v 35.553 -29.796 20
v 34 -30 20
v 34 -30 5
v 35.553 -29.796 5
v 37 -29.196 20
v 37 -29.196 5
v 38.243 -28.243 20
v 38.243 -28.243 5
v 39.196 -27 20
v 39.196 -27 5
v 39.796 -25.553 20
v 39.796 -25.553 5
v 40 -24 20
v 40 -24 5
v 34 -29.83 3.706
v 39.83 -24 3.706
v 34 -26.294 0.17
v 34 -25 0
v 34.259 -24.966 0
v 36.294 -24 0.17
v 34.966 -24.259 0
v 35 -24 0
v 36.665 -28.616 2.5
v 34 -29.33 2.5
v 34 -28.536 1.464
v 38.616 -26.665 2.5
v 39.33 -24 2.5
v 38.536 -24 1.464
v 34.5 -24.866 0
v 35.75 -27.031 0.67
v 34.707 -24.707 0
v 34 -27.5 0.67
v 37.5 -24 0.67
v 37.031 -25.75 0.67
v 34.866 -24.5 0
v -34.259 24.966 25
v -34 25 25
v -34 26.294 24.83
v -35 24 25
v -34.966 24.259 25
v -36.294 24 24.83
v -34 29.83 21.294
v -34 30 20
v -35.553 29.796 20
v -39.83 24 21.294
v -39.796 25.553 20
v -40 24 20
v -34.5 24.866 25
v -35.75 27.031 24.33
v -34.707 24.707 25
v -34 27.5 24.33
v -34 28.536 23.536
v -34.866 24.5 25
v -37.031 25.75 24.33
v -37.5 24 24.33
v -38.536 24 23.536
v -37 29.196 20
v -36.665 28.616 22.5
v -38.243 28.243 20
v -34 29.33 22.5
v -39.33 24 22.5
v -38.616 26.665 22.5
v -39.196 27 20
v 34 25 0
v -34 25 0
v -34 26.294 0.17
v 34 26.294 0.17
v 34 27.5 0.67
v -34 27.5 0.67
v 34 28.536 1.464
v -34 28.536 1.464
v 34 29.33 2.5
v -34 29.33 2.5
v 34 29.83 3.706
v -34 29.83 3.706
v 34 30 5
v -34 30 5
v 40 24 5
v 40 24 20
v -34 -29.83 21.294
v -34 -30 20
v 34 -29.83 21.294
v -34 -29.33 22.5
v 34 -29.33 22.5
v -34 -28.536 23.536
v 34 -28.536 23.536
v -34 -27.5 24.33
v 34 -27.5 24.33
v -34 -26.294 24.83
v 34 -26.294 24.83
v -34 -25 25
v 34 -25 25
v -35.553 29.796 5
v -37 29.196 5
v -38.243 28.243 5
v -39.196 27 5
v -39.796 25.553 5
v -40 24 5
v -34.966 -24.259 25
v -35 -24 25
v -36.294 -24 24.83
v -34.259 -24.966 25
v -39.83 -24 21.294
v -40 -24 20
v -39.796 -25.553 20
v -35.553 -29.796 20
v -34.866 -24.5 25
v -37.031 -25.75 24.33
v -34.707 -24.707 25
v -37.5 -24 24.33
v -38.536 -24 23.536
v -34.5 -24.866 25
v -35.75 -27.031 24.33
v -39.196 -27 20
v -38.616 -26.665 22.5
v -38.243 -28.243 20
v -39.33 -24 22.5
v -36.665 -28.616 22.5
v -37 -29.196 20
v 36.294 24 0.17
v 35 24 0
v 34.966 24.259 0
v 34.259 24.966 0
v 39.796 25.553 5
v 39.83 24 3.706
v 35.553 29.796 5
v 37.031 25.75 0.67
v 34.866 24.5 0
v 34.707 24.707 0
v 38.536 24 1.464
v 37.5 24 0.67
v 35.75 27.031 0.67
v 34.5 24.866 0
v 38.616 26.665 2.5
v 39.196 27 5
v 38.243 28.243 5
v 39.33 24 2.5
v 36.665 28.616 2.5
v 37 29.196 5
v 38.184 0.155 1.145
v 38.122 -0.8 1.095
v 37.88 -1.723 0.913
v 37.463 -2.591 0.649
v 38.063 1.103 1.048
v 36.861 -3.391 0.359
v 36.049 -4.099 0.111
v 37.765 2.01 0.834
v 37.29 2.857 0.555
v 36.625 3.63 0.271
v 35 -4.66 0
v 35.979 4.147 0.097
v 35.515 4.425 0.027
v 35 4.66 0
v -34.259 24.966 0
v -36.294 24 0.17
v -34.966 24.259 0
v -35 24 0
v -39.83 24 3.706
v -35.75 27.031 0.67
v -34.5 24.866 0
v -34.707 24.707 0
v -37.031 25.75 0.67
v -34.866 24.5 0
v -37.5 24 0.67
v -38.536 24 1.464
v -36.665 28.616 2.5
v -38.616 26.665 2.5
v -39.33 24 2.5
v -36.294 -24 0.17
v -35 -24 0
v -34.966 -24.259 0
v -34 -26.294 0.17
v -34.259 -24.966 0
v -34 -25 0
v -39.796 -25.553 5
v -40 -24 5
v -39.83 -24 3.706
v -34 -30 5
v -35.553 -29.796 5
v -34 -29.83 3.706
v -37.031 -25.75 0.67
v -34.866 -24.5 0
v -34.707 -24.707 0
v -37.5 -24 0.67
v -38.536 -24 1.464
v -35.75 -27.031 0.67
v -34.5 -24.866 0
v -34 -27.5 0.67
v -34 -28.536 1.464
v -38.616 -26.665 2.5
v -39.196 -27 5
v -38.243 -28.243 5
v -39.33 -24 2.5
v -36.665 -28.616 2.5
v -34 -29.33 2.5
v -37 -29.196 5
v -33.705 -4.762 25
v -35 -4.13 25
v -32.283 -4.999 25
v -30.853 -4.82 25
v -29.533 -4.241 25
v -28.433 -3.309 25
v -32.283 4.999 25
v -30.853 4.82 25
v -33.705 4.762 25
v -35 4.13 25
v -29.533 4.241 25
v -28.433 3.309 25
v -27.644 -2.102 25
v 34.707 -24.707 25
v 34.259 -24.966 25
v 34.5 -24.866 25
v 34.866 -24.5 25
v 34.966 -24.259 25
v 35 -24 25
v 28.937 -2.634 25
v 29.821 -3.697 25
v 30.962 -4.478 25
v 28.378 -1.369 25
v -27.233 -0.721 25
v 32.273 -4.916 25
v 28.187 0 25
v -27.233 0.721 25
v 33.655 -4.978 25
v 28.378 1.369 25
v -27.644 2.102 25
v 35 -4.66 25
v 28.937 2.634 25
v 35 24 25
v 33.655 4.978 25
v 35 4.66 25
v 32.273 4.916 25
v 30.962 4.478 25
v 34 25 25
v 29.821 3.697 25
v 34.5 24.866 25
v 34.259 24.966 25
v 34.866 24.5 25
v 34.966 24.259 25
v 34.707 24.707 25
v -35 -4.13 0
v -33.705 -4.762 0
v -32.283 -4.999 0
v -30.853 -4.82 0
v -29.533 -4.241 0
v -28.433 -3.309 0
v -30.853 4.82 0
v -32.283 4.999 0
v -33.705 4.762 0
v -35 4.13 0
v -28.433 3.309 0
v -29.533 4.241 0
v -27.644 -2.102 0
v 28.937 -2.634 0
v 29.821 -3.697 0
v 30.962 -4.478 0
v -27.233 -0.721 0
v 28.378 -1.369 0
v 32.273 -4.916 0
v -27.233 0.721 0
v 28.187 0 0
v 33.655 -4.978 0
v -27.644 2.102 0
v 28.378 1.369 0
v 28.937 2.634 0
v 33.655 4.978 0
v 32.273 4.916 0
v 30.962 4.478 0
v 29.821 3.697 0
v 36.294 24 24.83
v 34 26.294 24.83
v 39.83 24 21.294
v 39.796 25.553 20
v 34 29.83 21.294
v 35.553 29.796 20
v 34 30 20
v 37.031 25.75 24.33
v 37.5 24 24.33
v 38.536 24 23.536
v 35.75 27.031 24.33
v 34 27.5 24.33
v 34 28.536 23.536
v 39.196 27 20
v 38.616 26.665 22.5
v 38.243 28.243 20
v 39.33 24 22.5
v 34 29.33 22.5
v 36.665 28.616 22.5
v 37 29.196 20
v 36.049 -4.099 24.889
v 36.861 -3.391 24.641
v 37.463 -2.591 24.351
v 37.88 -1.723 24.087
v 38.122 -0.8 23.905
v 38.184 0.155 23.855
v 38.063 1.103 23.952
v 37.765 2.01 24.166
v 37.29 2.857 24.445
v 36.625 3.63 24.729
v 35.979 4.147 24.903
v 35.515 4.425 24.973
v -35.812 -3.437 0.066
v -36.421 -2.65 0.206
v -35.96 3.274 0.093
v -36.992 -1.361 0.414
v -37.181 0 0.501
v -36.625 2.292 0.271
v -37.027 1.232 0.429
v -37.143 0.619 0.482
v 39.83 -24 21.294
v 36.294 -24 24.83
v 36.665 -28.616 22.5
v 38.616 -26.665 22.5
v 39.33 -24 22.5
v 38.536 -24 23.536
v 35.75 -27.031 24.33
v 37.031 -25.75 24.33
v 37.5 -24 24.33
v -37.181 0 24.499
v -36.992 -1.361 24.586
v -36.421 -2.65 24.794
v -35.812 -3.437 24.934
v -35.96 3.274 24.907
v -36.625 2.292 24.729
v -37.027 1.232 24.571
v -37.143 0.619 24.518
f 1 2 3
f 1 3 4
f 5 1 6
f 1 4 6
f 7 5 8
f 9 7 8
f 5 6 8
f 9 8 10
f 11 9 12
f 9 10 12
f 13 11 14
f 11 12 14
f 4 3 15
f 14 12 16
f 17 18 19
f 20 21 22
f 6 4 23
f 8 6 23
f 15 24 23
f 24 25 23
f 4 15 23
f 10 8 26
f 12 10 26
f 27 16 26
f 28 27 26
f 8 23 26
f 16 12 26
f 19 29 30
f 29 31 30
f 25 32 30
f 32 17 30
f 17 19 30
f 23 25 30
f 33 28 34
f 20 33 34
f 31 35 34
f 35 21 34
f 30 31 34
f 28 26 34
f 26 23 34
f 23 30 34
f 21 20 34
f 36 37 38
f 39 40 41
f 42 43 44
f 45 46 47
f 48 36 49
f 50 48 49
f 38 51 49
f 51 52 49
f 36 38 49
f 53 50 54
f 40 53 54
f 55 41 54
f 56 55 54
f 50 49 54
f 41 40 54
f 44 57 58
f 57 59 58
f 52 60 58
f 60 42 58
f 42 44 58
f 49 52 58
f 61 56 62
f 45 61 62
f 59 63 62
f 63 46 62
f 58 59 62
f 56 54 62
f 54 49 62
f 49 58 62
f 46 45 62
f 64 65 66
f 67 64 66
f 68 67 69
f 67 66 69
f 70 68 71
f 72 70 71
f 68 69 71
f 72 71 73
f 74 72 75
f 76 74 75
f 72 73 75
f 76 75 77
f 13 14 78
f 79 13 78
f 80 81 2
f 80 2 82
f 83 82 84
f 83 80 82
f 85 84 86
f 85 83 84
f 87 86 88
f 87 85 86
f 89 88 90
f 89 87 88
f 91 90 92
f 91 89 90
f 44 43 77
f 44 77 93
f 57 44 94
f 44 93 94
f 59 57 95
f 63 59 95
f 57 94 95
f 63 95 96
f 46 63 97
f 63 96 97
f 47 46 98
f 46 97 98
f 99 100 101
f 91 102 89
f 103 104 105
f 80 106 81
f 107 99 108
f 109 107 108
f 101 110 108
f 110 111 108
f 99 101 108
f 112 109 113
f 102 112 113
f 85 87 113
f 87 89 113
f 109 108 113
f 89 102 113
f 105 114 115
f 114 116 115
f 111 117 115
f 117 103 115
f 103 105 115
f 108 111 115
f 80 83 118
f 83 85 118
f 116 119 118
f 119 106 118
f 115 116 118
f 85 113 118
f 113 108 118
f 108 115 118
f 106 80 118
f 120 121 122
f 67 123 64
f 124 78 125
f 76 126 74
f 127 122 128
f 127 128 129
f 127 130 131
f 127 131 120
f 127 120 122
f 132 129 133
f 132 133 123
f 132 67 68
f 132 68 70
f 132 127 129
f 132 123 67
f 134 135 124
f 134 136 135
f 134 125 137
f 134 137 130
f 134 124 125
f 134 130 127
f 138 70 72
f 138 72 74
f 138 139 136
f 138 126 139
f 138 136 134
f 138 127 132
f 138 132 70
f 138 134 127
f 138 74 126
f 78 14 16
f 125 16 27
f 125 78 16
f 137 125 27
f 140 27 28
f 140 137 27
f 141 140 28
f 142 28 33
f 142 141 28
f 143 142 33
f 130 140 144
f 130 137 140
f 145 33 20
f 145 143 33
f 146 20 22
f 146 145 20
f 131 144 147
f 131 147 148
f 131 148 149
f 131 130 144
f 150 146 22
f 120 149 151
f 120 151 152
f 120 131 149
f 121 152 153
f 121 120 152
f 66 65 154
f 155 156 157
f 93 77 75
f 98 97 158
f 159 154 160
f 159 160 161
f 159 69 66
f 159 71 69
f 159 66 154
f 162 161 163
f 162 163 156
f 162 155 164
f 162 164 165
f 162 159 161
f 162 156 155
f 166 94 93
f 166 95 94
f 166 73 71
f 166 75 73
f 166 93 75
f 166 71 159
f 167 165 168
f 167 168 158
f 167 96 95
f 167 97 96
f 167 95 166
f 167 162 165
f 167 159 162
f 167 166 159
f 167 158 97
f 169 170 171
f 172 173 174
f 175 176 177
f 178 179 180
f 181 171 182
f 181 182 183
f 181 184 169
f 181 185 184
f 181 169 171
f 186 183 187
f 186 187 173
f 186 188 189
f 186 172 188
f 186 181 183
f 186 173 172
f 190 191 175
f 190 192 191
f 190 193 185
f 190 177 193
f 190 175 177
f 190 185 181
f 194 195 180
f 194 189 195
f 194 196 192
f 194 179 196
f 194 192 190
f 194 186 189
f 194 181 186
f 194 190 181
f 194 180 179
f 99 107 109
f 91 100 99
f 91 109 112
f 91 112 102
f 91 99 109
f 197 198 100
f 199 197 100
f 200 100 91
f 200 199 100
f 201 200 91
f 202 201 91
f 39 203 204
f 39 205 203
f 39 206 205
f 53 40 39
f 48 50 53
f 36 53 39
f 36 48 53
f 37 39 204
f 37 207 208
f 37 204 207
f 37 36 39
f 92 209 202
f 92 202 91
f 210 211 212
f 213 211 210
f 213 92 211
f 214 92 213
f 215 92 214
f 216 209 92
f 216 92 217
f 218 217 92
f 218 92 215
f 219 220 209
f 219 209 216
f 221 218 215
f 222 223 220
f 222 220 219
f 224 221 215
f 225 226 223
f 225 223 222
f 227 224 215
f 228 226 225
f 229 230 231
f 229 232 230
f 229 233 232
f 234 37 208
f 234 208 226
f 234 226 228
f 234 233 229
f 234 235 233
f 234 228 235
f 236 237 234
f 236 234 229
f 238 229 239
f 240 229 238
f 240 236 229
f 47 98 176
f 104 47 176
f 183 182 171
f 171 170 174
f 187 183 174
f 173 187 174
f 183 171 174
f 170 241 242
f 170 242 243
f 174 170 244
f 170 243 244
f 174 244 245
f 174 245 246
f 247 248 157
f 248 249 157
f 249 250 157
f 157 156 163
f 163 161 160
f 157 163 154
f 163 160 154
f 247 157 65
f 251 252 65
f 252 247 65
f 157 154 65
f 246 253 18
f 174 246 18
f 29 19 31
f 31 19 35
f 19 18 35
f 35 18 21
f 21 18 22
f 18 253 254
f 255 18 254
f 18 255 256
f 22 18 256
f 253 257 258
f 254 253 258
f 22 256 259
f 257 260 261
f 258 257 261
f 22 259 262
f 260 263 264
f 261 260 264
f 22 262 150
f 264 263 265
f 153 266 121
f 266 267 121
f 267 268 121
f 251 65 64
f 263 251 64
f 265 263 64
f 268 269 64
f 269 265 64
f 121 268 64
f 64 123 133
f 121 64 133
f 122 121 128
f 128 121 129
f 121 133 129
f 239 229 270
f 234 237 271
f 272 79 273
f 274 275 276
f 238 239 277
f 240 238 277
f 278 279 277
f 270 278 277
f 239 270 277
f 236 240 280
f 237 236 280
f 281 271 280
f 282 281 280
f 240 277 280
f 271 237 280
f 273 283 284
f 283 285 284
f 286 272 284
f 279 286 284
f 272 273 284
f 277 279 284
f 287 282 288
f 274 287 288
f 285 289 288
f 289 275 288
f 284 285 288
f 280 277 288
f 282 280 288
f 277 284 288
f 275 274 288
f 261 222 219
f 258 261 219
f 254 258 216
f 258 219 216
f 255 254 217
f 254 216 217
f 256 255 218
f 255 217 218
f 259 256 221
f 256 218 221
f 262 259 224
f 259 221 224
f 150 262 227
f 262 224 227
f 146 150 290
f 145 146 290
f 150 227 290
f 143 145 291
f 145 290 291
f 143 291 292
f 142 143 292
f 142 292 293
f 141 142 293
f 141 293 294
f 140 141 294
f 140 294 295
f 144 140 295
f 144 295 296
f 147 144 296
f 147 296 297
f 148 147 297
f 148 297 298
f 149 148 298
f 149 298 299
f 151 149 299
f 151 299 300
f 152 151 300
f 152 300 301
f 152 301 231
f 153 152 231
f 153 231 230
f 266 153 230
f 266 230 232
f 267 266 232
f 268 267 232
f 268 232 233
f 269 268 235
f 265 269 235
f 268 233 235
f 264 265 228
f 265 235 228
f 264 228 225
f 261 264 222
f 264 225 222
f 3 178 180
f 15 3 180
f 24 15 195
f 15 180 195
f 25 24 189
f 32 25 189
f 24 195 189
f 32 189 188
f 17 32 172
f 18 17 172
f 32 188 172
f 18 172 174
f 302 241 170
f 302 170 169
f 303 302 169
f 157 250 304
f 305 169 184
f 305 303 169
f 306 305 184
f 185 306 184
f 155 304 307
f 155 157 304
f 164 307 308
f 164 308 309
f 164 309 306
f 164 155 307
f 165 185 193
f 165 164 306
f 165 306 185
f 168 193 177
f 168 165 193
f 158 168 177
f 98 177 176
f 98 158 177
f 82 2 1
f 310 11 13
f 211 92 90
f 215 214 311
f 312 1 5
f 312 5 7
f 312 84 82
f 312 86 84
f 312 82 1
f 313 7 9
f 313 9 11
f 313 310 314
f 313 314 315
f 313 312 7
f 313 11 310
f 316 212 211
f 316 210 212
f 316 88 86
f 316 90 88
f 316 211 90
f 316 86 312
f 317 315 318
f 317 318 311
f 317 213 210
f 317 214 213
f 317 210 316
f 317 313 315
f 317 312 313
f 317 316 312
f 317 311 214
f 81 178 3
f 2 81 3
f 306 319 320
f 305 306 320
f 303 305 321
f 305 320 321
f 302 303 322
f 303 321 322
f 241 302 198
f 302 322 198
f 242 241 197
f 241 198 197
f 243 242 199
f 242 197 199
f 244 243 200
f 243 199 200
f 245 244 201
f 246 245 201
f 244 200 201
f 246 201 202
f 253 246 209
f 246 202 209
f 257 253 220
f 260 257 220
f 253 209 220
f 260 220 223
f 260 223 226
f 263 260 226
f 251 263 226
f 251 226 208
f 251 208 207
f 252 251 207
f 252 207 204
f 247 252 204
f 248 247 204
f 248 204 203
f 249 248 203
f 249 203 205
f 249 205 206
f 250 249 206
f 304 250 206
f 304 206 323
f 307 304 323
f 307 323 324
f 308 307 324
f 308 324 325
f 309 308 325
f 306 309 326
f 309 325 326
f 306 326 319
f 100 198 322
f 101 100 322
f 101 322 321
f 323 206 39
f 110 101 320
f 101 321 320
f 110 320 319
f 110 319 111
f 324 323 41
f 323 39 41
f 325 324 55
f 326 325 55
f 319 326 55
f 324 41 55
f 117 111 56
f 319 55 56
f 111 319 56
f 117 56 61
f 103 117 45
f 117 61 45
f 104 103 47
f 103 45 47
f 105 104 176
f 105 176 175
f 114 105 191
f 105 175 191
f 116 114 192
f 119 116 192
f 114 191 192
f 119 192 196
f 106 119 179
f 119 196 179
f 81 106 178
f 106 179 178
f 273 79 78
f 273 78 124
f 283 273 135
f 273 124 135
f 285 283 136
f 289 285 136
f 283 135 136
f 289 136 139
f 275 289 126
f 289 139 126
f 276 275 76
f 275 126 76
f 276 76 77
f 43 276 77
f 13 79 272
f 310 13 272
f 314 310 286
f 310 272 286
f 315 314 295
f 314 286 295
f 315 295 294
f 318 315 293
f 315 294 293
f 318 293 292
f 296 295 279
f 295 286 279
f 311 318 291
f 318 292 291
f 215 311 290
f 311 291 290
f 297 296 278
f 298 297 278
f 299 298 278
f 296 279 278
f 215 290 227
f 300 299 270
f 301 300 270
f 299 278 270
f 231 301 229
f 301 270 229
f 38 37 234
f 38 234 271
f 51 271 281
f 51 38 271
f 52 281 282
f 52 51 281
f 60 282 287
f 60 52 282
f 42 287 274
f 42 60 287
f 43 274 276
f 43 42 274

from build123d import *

# Parameters (mm, degrees)
F1_DEPTH     = 25
F2_D         = 10
F3_T1_DEPTH  = 48
F3_T3_DEPTH  = 68
F3_T6_ANGLE  = 90
F3_T8_ANGLE  = 90
F3_T10_ANGLE = 90
F3_T12_ANGLE = 90
F3_T14_ANGLE = 90
F3_T16_ANGLE = 90
F3_T18_ANGLE = 90
F3_T20_ANGLE = 90


# Not quite as in the source:
# - a fillet or chamfer that OpenCascade refuses, or shapes differently, is made with other operations: its cross-section is extruded or revolved along the edge and cut away or added


with BuildPart() as f1:
    # F0 (on Top) → F1 (new body)
    with BuildSketch(Plane.XY):
        with BuildLine():
            ThreePointArc((40, 24), (38.2426406871, 28.2426406871), (34, 30))
            Line((34, 30), (-34, 30))
            ThreePointArc((-34, 30), (-38.2426406871, 28.2426406871), (-40, 24))
            Line((-40, 24), (-40, -24))
            ThreePointArc((-40, -24), (-38.2426406871, -28.2426406871), (-34, -30))
            Line((-34, -30), (34, -30))
            ThreePointArc((34, -30), (38.2426406871, -28.2426406871), (40, -24))
            Line((40, -24), (40, 24))
        make_face()
    extrude(amount=F1_DEPTH)

    # F2 (through all)
    with Locations(Plane(origin=(0, 0, 0), x_dir=(1, 0, 0), z_dir=(0, 0, -1))):
        with Locations((-32.1810245514, 0), (33.1866517663, 0)):
            Hole(F2_D / 2)

    # F3: fillet of radius 5 on 16 edges, made by hand

    # F3_s2 → F3_t1 (cut)
    with BuildSketch(Plane.XZ.offset(-24)):
        with BuildLine():
            ThreePointArc((40, 20), (38.5355339059, 23.5355339059), (35, 25))
            Line((35, 25), (40, 25))
            Line((40, 25), (40, 20))
        make_face()
        with BuildLine():
            ThreePointArc((40, 5), (38.5355339059, 1.4644660941), (35, 0))
            Line((35, 0), (40, 0))
            Line((40, 0), (40, 5))
        make_face()
        with BuildLine():
            ThreePointArc((-35, 0), (-38.5355339059, 1.4644660941), (-40, 5))
            Line((-40, 5), (-40, 0))
            Line((-40, 0), (-35, 0))
        make_face()
        with BuildLine():
            ThreePointArc((-35, 25), (-38.5355339059, 23.5355339059), (-40, 20))
            Line((-40, 20), (-40, 25))
            Line((-40, 25), (-35, 25))
        make_face()
    extrude(amount=F3_T1_DEPTH, mode=Mode.SUBTRACT)

    # F3_s4 → F3_t3 (cut)
    with BuildSketch(Plane.YZ.offset(-34)):
        with BuildLine():
            ThreePointArc((-30, 5), (-28.5355339059, 1.4644660941), (-25, 0))
            Line((-25, 0), (-30, 0))
            Line((-30, 0), (-30, 5))
        make_face()
        with BuildLine():
            ThreePointArc((-30, 20), (-28.5355339059, 23.5355339059), (-25, 25))
            Line((-25, 25), (-30, 25))
            Line((-30, 25), (-30, 20))
        make_face()
        with BuildLine():
            ThreePointArc((25, 0), (28.5355339059, 1.4644660941), (30, 5))
            Line((30, 5), (30, 0))
            Line((30, 0), (25, 0))
        make_face()
        with BuildLine():
            ThreePointArc((25, 25), (28.5355339059, 23.5355339059), (30, 20))
            Line((30, 20), (30, 25))
            Line((30, 25), (25, 25))
        make_face()
    extrude(amount=F3_T3_DEPTH, mode=Mode.SUBTRACT)

    # F3_s5 → F3_t6 (revolve, cut)
    with BuildSketch(Plane.YZ.offset(34)):
        with BuildLine():
            ThreePointArc((-30, 5), (-28.5355339059, 1.4644660941), (-25, 0))
            Line((-25, 0), (-30, 0))
            Line((-30, 0), (-30, 5))
        make_face()
    revolve(axis=Axis((34, -24, 0), (0, 0, 1)), revolution_arc=F3_T6_ANGLE, mode=Mode.SUBTRACT)

    # F3_s7 → F3_t8 (revolve, cut)
    with BuildSketch(Plane.YZ.offset(34)):
        with BuildLine():
            ThreePointArc((-30, 20), (-28.5355339059, 23.5355339059), (-25, 25))
            Line((-25, 25), (-30, 25))
            Line((-30, 25), (-30, 20))
        make_face()
    revolve(axis=Axis((34, -24, 25), (0, 0, 1)), revolution_arc=F3_T8_ANGLE, mode=Mode.SUBTRACT)

    # F3_s9 → F3_t10 (revolve, cut)
    with BuildSketch(Plane.XZ.offset(24)):
        with BuildLine():
            ThreePointArc((-35, 0), (-38.5355339059, 1.4644660941), (-40, 5))
            Line((-40, 5), (-40, 0))
            Line((-40, 0), (-35, 0))
        make_face()
    revolve(axis=Axis((-34, -24, 0), (0, 0, 1)), revolution_arc=F3_T10_ANGLE, mode=Mode.SUBTRACT)

    # F3_s11 → F3_t12 (revolve, cut)
    with BuildSketch(Plane.XZ.offset(-24)):
        with BuildLine():
            ThreePointArc((35, 0), (38.5355339059, 1.4644660941), (40, 5))
            Line((40, 5), (40, 0))
            Line((40, 0), (35, 0))
        make_face()
    revolve(axis=Axis((34, 24, 0), (0, 0, 1)), revolution_arc=F3_T12_ANGLE, mode=Mode.SUBTRACT)

    # F3_s13 → F3_t14 (revolve, cut)
    with BuildSketch(Plane.YZ.offset(-34)):
        with BuildLine():
            ThreePointArc((25, 0), (28.5355339059, 1.4644660941), (30, 5))
            Line((30, 5), (30, 0))
            Line((30, 0), (25, 0))
        make_face()
    revolve(axis=Axis((-34, 24, 0), (0, 0, 1)), revolution_arc=F3_T14_ANGLE, mode=Mode.SUBTRACT)

    # F3_s15 → F3_t16 (revolve, cut)
    with BuildSketch(Plane.XZ.offset(24)):
        with BuildLine():
            ThreePointArc((-35, 25), (-38.5355339059, 23.5355339059), (-40, 20))
            Line((-40, 20), (-40, 25))
            Line((-40, 25), (-35, 25))
        make_face()
    revolve(axis=Axis((-34, -24, 25), (0, 0, 1)), revolution_arc=F3_T16_ANGLE, mode=Mode.SUBTRACT)

    # F3_s17 → F3_t18 (revolve, cut)
    with BuildSketch(Plane.XZ.offset(-24)):
        with BuildLine():
            ThreePointArc((35, 25), (38.5355339059, 23.5355339059), (40, 20))
            Line((40, 20), (40, 25))
            Line((40, 25), (35, 25))
        make_face()
    revolve(axis=Axis((34, 24, 25), (0, 0, 1)), revolution_arc=F3_T18_ANGLE, mode=Mode.SUBTRACT)

    # F3_s19 → F3_t20 (revolve, cut)
    with BuildSketch(Plane.YZ.offset(-34)):
        with BuildLine():
            ThreePointArc((25, 25), (28.5355339059, 23.5355339059), (30, 20))
            Line((30, 20), (30, 25))
            Line((30, 25), (25, 25))
        make_face()
    revolve(axis=Axis((-34, 24, 25), (0, 0, 1)), revolution_arc=F3_T20_ANGLE, mode=Mode.SUBTRACT)


solid = f1.part
